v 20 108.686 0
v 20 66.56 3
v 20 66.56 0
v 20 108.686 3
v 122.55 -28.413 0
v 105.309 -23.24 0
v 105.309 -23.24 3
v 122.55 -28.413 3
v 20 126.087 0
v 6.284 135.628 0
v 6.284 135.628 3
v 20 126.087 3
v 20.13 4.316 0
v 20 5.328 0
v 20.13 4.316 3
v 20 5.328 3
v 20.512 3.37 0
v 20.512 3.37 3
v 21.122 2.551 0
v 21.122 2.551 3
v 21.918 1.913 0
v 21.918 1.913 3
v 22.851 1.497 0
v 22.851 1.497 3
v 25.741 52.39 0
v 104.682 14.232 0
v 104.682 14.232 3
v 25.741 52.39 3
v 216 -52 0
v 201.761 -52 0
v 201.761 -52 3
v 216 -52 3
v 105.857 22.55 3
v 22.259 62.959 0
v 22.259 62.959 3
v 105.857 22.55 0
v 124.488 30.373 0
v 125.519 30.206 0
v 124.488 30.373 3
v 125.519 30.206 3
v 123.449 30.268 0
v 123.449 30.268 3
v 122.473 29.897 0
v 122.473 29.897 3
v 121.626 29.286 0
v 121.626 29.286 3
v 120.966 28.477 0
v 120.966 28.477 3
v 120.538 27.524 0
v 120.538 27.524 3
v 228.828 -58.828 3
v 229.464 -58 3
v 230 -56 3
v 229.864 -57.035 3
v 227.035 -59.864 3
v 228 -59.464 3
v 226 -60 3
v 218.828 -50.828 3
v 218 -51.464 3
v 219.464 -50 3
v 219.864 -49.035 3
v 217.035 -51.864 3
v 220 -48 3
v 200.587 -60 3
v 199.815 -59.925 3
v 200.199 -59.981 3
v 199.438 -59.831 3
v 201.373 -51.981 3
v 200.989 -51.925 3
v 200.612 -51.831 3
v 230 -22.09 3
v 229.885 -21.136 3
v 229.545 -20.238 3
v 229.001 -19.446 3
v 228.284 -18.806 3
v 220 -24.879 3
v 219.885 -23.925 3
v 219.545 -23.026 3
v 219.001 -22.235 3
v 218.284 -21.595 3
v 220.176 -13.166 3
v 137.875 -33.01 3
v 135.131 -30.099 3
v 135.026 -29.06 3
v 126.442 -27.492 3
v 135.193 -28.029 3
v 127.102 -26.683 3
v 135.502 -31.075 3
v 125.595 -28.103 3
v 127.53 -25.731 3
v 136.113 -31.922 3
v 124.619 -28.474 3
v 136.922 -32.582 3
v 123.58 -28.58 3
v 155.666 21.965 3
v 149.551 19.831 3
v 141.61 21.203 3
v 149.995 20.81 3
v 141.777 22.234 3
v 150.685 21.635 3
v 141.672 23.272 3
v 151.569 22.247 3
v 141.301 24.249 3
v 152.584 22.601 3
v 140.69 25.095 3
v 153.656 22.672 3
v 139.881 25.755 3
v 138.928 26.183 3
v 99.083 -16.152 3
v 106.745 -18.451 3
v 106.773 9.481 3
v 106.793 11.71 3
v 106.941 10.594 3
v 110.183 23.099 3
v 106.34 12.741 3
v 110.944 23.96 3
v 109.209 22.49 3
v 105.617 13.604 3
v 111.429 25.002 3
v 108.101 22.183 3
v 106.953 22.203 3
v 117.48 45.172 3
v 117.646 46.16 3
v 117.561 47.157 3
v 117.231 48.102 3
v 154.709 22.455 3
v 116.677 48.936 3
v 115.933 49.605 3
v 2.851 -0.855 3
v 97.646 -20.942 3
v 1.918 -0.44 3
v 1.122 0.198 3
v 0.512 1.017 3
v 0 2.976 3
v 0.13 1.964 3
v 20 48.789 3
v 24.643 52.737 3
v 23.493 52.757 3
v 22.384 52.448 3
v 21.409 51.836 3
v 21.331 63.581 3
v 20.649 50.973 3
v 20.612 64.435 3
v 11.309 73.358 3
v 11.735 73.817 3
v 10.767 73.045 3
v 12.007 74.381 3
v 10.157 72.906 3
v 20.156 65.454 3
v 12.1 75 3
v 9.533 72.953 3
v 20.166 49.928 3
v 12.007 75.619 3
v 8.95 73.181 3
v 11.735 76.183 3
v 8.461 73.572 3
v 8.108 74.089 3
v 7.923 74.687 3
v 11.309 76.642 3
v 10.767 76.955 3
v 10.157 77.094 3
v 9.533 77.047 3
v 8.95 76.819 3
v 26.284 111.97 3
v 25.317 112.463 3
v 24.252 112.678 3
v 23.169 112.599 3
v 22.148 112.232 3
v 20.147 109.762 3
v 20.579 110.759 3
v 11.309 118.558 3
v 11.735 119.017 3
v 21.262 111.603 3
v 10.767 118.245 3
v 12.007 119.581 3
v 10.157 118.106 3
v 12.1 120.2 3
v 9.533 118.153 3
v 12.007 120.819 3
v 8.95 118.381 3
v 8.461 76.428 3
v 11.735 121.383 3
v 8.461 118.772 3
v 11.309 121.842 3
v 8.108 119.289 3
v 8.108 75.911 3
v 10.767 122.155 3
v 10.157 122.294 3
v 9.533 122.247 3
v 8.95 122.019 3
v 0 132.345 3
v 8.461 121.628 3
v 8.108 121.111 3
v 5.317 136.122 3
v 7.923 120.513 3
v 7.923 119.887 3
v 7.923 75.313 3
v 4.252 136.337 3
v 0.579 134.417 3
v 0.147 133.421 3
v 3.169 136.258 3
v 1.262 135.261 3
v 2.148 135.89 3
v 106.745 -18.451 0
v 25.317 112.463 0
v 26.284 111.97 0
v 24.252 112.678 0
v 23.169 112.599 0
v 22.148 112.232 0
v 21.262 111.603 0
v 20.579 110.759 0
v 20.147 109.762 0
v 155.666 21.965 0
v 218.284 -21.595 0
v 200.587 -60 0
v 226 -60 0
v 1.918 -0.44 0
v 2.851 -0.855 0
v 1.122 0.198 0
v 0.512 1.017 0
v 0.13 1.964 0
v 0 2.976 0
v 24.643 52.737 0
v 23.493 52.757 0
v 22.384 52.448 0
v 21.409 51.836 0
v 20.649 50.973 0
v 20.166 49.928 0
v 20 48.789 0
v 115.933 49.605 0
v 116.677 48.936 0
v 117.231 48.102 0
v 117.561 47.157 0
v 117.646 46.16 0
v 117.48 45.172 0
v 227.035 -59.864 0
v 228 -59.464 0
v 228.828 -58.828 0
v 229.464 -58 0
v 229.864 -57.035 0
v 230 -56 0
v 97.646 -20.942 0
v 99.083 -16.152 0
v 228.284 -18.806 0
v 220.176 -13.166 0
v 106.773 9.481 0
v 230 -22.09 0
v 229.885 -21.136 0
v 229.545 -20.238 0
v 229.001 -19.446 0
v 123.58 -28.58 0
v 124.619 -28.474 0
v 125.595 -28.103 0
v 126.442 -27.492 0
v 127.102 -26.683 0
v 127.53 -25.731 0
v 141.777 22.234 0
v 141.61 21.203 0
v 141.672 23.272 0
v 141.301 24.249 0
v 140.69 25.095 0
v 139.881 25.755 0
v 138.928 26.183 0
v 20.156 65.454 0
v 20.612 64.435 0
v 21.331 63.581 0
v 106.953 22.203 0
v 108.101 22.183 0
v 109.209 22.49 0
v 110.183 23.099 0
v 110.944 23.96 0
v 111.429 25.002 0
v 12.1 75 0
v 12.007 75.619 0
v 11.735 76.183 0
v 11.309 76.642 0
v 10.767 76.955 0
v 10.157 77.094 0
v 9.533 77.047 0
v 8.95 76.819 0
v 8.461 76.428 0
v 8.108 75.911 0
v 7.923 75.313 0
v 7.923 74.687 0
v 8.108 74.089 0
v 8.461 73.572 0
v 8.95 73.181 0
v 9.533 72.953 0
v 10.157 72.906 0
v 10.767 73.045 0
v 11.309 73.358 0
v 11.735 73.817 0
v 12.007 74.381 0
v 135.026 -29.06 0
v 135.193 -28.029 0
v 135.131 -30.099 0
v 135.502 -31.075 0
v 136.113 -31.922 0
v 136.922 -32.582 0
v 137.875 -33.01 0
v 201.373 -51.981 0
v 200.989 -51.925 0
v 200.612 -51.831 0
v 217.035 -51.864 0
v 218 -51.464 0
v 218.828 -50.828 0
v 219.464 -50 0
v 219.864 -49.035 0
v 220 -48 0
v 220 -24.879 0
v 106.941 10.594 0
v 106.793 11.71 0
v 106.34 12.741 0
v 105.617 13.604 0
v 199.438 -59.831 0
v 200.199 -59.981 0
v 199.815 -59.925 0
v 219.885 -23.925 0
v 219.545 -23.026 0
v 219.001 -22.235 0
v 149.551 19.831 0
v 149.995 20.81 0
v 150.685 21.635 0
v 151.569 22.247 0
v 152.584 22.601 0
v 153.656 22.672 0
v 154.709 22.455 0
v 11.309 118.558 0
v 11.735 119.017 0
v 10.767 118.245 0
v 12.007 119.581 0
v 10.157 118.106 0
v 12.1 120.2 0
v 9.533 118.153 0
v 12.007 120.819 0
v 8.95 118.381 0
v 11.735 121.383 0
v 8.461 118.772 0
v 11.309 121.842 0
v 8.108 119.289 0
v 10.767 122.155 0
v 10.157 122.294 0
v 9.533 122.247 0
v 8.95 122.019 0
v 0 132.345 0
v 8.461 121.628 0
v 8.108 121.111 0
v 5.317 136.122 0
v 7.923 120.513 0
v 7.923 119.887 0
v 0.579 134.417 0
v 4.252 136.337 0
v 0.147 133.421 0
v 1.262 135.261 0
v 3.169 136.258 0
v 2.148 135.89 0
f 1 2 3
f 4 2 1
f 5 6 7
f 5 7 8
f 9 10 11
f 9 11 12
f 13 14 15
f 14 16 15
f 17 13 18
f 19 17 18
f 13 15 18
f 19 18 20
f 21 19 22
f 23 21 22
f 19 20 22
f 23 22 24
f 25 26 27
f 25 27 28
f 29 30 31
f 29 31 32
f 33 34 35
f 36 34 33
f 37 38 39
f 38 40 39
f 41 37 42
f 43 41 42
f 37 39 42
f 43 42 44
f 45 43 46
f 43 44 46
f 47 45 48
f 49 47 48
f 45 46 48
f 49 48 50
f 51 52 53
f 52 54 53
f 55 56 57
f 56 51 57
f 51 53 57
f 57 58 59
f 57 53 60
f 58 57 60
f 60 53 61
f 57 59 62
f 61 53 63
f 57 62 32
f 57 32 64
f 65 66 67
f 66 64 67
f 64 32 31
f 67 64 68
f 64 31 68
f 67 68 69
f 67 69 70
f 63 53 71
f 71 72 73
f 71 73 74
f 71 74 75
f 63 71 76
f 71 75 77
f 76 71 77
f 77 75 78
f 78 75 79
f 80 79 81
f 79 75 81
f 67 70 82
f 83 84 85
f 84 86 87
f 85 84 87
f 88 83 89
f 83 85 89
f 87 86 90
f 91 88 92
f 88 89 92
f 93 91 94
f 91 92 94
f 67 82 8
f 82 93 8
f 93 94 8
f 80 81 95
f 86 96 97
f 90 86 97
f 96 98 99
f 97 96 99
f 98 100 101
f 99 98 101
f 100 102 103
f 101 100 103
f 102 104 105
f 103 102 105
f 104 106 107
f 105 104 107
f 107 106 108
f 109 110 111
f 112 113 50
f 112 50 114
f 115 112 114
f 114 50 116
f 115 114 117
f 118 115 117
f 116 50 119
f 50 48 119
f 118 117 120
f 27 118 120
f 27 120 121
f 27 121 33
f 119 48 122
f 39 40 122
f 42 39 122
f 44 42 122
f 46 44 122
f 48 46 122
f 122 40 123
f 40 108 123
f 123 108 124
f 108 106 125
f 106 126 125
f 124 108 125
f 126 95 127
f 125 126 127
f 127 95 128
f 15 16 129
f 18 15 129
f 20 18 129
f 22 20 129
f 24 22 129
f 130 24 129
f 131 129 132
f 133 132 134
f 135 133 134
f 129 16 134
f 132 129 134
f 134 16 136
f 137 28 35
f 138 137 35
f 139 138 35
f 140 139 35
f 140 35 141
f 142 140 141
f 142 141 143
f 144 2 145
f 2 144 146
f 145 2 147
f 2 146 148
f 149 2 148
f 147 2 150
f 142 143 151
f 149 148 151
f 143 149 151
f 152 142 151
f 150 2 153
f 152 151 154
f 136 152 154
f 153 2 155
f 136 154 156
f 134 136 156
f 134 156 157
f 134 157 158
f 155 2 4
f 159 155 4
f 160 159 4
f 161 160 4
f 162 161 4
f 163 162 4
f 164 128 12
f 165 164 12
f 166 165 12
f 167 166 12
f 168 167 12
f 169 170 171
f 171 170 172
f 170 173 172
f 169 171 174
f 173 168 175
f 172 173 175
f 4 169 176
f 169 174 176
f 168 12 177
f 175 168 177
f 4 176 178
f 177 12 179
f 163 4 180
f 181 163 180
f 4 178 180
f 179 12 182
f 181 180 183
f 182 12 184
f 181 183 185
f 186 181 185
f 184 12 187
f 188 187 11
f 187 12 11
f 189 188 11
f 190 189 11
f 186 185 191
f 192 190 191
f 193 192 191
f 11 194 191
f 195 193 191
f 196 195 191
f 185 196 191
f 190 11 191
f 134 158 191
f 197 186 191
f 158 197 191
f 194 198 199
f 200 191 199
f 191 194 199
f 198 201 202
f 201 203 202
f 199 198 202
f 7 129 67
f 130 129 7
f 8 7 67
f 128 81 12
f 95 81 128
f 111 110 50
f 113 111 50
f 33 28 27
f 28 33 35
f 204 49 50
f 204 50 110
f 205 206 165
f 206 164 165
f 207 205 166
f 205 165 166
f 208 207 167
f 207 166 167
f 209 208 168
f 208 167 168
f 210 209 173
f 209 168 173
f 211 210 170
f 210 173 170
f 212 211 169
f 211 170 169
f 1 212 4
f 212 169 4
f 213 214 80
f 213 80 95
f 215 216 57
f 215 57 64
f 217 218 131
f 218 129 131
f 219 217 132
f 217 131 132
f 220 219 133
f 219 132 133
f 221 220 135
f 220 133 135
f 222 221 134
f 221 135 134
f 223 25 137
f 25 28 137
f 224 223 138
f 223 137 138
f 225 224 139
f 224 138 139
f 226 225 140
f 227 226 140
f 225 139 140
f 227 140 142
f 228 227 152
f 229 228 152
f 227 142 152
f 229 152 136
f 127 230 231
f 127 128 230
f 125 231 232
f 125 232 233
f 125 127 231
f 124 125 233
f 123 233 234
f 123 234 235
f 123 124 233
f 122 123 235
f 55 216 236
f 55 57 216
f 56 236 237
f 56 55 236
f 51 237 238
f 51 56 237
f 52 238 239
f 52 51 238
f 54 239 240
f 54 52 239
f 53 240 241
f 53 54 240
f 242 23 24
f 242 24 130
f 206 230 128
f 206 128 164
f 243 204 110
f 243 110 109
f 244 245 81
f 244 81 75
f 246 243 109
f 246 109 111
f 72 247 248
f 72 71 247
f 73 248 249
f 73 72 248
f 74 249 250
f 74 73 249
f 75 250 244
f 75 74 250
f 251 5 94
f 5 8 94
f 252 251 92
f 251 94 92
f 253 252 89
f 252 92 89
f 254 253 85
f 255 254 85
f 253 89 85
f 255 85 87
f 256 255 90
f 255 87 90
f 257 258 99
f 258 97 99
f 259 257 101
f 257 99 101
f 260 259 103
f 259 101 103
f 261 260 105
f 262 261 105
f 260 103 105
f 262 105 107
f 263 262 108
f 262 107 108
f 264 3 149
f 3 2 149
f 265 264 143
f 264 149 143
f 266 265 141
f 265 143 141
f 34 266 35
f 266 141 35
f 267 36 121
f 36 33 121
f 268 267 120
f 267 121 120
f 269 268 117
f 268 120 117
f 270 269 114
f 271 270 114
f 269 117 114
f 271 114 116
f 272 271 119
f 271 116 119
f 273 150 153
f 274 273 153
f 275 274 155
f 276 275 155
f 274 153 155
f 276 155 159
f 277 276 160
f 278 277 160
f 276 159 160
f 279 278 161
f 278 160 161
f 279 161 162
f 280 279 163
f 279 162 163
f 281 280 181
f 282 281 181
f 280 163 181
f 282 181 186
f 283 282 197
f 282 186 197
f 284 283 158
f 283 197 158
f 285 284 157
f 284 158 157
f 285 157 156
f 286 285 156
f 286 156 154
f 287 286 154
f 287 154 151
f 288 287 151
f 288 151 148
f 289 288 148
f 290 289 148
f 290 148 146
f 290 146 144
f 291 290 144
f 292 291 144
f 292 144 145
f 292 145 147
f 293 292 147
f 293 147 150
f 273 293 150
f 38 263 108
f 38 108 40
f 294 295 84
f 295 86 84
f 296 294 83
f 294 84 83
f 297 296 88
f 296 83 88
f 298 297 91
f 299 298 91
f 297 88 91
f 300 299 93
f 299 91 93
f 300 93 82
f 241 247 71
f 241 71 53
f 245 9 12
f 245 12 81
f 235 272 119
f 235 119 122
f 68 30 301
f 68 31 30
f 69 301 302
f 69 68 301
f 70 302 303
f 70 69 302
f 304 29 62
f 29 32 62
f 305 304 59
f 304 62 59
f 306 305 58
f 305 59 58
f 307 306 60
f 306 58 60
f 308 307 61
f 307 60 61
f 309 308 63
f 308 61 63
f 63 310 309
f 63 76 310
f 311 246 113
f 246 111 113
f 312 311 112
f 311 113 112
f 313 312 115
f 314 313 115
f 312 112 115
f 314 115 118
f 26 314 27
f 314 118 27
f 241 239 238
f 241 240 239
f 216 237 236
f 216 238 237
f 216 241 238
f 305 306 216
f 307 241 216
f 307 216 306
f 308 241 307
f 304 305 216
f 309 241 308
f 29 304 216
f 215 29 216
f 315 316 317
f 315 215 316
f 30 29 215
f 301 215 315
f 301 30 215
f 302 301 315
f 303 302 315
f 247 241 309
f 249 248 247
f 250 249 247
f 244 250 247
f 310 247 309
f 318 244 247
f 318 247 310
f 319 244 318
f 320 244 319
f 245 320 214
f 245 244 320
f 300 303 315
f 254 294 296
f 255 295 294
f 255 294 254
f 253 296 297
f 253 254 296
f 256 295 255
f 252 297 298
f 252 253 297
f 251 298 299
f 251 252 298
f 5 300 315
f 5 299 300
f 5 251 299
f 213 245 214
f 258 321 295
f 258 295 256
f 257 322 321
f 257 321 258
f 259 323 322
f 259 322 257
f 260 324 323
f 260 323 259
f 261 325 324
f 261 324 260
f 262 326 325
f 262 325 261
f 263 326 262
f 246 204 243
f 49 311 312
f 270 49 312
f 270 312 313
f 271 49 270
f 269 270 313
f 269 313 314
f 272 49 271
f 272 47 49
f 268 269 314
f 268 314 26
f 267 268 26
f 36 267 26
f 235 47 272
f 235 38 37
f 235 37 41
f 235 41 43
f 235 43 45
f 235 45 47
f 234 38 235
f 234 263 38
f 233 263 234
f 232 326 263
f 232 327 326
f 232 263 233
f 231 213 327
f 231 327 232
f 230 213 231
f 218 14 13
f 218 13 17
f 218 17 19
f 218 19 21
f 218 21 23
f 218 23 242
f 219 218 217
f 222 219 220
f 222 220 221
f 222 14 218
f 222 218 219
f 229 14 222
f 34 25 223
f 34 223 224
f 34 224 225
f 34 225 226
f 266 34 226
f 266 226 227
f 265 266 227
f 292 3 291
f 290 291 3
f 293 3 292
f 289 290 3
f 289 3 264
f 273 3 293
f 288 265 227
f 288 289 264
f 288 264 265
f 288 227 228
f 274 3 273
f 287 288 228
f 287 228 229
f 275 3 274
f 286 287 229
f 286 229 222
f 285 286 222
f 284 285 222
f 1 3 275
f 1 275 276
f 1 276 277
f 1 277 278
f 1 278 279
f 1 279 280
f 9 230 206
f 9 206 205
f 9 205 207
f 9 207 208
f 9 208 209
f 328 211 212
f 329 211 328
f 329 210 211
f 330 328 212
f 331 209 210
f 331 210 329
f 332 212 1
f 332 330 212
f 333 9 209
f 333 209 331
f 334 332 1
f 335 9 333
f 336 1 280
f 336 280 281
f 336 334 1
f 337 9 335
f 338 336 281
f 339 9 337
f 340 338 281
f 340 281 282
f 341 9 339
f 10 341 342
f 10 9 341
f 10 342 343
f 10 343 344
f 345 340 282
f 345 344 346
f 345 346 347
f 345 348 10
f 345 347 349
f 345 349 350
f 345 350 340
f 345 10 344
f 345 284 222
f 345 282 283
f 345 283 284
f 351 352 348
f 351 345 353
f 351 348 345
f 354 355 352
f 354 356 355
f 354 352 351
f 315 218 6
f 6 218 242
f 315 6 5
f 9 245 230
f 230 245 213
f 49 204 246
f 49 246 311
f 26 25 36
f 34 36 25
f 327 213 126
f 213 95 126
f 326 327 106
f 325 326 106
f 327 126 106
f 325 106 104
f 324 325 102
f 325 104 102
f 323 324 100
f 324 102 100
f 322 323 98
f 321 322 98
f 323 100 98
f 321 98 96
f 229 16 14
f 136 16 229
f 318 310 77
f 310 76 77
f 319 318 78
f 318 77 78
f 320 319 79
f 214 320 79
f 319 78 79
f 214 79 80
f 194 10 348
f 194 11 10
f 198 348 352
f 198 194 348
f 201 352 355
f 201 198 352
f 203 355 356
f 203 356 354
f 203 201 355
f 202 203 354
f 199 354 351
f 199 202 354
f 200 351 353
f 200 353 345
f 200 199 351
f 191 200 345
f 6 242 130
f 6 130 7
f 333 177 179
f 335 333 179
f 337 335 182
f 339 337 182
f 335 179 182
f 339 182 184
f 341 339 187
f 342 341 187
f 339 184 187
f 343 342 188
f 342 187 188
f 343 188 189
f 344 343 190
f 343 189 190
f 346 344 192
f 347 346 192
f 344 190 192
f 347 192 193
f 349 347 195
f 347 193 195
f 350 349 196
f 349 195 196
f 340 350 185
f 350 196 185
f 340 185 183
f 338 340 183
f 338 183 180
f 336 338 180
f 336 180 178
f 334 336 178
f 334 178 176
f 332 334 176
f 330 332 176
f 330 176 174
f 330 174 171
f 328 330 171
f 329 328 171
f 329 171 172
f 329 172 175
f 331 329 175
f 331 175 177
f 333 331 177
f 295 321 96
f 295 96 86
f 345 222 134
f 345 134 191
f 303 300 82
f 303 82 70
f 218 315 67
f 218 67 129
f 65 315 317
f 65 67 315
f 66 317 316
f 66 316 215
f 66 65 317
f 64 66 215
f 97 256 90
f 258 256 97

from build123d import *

# Parameters (mm, degrees)
EXTRUDE_1_DEPTH     = 3
SKETCH_2_R          = 2.1
CUT_EXTRUDE_1_DEPTH = 39
CUT_EXTRUDE_2_DEPTH = 10
EXTRUDE_4_DEPTH     = 3
FILLET_1_R          = 4
FILLET_2_R          = 4


with BuildPart() as part:
    # Эскиз1 → Бобышка-Вытянуть1 (new body)
    with BuildSketch(Plane.XY):
        Polygon((0, 0), (0, 140), (230, -20), (230, -60), (200, -60), align=None)
    extrude(amount=EXTRUDE_1_DEPTH)

    # Эскиз2 → Вырез-Вытянуть1 (cut)
    with BuildSketch(Plane.XY.offset(3)):
        with Locations((10, 75)):
            Circle(SKETCH_2_R)
        with Locations((10, 120.2)):
            Circle(SKETCH_2_R)
    extrude(amount=-CUT_EXTRUDE_1_DEPTH, mode=Mode.SUBTRACT)

    # Эскиз5 → Вырез-Вытянуть2 (cut)
    with BuildSketch(Plane.XY.offset(3)):
        Polygon((220, -19.134315533), (220, -55), (200.733844182, -55), (20, -0.779846746), (20, 119.99611925), align=None)
    extrude(amount=-CUT_EXTRUDE_2_DEPTH, mode=Mode.SUBTRACT)

    # Эскиз7 → Бобышка-Вытянуть4 (add)
    with BuildSketch(Plane.XY):
        Polygon((105.308657106, -23.240351925), (126.380835381, -29.562005407), (142.759664858, 25.034092851), (121.687486583, 31.355746333), (106.745396534, -18.451220499), (99.082786252, -16.152437414), (107.752824145, 12.747688898), (20, 55.165339274), (20, 64.05093323), (110.080901053, 20.507945256), (118.313419369, 47.949672977), (20, 116.341616886), (20, 126.086956522), (220.176468292, -13.166238812), (220.176468292, -22.911578447), (151.136541271, 25.116196871), (134.043445663, -31.860788492), (201.17415069, -52), (220, -52), (220, -55), (200.733844182, -55), (20, -0.779846746), (20, 2.352245207), (97.646046824, -20.94156884), align=None)
    extrude(amount=EXTRUDE_4_DEPTH)

    # Скругление1
    fillet_1_edges = [part.edges().sort_by_distance(p)[0] for p in [
        (0, 0, 1.5),
        (0, 140, 1.5),
        (230, -20, 1.5),
        (230, -60, 1.5),
        (200, -60, 1.5),
    ]]
    fillet(fillet_1_edges, radius=FILLET_1_R)

    # Скругление2
    fillet_2_edges = [part.edges().sort_by_distance(p)[0] for p in [
        (220, -22.788817896, 1.5),
        (151.136541271, 25.116196871, 1.5),
        (20, 2.352245207, 1.5),
        (220, -52, 1.5),
        (201.17415069, -52, 1.5),
        (134.043445663, -31.860788492, 1.5),
        (20, 116.341616886, 1.5),
        (118.313419369, 47.949672977, 1.5),
        (110.080901053, 20.507945256, 1.5),
        (20, 64.05093323, 1.5),
        (20, 55.165339274, 1.5),
        (107.752824145, 12.747688898, 1.5),
        (121.687486583, 31.355746333, 1.5),
        (142.759664858, 25.034092851, 1.5),
        (126.380835381, -29.562005407, 1.5),
    ]]
    fillet(fillet_2_edges, radius=FILLET_2_R)


solid = part.part
